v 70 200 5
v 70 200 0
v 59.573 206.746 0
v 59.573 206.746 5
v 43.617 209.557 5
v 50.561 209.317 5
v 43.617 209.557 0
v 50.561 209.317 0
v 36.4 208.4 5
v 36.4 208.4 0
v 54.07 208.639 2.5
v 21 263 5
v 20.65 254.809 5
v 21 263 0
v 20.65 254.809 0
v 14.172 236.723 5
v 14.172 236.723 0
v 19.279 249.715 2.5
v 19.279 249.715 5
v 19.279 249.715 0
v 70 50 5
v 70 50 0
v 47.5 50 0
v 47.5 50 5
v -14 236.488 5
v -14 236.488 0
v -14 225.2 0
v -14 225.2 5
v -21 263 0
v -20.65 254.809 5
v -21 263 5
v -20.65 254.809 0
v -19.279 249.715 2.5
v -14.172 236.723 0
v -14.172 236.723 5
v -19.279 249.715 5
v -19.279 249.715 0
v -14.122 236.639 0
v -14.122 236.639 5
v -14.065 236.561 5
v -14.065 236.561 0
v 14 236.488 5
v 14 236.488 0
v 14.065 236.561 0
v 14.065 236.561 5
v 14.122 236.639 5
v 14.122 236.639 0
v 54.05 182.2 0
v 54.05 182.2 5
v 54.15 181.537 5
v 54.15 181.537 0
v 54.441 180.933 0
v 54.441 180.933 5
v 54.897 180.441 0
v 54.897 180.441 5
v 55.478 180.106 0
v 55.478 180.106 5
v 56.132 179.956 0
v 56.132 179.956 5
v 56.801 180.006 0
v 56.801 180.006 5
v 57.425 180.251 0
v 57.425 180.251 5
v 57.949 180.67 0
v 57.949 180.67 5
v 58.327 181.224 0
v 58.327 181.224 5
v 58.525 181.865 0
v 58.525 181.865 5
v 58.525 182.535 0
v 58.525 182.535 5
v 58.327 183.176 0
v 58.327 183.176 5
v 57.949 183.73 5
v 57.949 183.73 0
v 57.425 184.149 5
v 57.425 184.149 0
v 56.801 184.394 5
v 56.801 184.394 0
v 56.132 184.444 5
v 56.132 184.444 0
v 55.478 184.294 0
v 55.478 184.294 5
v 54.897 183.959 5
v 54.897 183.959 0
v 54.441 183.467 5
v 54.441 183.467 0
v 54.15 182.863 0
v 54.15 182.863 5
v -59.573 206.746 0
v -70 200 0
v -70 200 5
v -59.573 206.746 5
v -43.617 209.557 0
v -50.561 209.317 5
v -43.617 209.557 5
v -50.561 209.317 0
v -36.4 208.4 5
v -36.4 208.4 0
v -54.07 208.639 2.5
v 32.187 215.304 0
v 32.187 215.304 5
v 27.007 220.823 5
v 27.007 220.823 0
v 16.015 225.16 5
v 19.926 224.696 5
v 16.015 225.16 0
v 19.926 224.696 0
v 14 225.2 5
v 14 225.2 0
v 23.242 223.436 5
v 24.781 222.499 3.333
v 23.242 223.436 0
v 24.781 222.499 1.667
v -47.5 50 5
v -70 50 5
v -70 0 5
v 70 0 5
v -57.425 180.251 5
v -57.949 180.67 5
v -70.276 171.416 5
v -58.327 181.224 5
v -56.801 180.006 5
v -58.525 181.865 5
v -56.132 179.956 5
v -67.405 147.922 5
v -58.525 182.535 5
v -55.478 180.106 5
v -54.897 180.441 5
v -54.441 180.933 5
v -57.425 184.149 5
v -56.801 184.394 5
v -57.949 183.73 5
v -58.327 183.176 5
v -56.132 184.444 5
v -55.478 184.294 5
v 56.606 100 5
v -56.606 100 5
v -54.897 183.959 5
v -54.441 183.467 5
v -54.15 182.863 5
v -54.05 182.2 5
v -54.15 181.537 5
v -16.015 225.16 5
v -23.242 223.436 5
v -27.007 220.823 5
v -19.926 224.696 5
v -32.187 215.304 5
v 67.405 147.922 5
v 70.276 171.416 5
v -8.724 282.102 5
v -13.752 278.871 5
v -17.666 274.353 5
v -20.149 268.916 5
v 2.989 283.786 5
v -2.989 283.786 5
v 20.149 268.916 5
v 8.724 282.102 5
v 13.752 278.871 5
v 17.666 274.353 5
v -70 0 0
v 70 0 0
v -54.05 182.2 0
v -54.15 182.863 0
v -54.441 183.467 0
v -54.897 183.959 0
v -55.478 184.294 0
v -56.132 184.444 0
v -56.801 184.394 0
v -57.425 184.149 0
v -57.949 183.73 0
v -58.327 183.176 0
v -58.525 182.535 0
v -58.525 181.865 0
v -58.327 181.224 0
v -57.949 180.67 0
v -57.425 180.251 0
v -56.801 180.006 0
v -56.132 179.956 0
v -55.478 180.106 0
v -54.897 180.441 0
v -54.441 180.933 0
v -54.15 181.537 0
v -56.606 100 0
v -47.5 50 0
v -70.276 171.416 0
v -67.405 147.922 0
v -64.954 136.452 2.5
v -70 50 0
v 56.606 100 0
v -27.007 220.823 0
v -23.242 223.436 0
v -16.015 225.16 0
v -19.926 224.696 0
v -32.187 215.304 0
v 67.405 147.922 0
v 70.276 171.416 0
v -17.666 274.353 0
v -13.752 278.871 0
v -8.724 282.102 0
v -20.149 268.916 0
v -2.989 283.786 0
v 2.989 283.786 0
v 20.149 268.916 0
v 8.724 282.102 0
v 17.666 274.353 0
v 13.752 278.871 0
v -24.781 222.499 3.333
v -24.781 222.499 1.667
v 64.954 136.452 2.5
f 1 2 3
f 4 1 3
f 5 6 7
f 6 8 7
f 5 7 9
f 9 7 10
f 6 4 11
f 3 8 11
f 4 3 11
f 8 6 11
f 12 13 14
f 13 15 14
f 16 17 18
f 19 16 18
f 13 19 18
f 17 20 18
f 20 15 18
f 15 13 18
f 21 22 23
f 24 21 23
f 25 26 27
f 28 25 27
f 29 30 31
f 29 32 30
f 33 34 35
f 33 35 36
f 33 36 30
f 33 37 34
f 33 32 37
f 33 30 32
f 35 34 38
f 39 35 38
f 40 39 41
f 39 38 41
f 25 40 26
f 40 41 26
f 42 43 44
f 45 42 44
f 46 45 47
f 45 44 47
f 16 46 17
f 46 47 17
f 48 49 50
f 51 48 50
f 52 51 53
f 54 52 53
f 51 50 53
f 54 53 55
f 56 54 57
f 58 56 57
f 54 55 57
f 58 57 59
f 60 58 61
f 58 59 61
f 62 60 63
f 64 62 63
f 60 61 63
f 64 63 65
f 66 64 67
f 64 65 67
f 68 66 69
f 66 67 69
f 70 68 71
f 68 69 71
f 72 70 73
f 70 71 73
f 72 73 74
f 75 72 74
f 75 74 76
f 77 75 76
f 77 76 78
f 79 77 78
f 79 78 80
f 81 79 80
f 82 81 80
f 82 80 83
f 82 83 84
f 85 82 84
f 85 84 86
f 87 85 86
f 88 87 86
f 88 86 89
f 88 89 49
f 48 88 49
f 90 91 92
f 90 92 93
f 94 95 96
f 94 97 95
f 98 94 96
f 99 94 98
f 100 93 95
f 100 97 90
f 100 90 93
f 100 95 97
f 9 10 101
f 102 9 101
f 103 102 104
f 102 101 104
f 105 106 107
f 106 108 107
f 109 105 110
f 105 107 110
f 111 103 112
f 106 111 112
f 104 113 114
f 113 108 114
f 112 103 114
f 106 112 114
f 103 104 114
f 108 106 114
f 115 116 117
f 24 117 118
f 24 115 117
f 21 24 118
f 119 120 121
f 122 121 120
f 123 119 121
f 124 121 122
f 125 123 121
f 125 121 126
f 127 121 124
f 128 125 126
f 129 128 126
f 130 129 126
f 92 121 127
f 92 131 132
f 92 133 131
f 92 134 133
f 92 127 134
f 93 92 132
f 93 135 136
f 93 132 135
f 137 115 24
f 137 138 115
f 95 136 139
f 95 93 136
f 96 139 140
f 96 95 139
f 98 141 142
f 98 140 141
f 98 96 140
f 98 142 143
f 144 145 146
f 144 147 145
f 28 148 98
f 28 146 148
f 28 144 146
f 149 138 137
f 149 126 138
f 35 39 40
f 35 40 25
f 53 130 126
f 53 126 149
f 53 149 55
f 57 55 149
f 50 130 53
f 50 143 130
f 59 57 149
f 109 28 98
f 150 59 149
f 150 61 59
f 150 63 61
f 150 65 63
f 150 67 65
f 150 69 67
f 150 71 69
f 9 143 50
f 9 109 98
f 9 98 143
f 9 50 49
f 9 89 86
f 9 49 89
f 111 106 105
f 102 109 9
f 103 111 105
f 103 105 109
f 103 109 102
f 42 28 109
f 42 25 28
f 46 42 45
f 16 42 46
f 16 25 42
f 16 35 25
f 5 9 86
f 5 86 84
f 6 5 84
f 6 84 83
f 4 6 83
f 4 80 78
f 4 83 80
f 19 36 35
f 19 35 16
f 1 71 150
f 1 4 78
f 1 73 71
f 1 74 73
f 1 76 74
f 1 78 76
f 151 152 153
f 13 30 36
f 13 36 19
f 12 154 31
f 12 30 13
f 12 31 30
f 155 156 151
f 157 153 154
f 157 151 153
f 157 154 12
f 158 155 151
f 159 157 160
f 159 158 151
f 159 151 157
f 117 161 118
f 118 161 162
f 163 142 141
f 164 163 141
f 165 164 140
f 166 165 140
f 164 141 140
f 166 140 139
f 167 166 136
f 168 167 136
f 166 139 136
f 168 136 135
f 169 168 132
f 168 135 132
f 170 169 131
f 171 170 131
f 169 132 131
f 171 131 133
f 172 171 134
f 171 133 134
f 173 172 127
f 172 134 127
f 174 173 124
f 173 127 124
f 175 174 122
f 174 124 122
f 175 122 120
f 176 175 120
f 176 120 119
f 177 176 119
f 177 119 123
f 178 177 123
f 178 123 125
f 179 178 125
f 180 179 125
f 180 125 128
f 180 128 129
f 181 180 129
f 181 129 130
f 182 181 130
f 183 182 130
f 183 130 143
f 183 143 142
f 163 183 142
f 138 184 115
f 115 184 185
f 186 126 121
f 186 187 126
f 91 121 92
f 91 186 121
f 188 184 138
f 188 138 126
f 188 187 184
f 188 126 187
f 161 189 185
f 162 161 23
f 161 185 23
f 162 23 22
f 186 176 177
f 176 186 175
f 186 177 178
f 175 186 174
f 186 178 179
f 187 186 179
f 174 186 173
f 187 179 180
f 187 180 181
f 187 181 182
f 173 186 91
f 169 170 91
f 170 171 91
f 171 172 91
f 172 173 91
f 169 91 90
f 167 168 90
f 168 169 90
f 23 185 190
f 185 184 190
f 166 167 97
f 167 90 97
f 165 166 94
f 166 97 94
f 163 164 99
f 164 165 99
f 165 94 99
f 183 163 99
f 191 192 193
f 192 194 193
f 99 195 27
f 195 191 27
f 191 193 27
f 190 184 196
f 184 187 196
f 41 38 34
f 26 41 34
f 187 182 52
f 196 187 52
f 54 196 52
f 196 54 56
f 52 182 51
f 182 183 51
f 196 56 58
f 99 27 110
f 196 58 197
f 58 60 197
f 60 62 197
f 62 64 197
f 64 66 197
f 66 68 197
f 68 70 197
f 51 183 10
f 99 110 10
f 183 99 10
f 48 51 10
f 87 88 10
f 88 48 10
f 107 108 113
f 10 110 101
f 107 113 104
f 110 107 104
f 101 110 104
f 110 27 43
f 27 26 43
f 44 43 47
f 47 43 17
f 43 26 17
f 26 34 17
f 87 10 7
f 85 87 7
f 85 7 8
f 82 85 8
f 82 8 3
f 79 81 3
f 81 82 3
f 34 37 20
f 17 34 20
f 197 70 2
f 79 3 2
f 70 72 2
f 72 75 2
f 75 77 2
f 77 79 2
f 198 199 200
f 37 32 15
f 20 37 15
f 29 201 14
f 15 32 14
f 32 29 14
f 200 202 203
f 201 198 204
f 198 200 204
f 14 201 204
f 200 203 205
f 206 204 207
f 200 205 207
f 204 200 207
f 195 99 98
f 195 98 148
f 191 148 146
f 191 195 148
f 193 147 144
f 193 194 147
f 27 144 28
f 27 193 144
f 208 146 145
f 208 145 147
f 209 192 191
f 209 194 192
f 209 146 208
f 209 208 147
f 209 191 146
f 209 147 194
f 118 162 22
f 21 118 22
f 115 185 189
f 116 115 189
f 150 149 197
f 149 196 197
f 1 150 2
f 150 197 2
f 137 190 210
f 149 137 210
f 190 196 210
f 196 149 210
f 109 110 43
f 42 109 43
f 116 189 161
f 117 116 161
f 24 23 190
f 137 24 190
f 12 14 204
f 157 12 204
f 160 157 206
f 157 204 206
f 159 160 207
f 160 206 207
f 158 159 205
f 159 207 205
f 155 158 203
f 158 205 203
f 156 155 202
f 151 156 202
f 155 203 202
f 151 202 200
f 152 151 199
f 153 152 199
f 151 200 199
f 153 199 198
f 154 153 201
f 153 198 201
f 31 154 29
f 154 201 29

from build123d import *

# Parameters (mm, degrees)
RESSALTO_EXTRUS_O1_DEPTH = 5
ESBO_O3_R                = 2.25
CORTE_EXTRUS_O1_DEPTH    = 293.648462736


with BuildPart() as part:
    # Esboço1 → Ressalto-extrusão1 (new body)
    with BuildSketch(Plane.XY):
        with BuildLine():
            Line((-70, 50), (-70, 0))
            Line((-70, 0), (70, 0))
            Line((70, 0), (70, 50))
            Line((70, 50), (47.5, 50))
            Line((47.5, 50), (56.60599572, 100))
            add(Edge.make_bspline(
                [(56.60599572, 100), (58.822881578, 111.230467147), (70.624101453, 157.653217098), (70.983496175, 170.948411875), (70, 200)],
                knots=[0, 0, 0, 0, 0.304799144, 1, 1, 1, 1], degree=3))
            add(Edge.make_bspline(
                [(70, 200), (54.940172813, 213.077606657), (36.4, 208.4)],
                knots=[0, 0, 0, 1, 1, 1], degree=2))
            add(Edge.make_bspline(
                [(36.4, 208.4), (36.384425779, 208.408148411), (31.853718899, 218.695035342), (19.625229428, 225.496752597), (14.287120073, 225.126645694), (14, 225.2)],
                knots=[0, 0, 0, 0, 0.552885048, 0.635199122, 0.823140743, 0.823140743, 0.823140743, 0.823140743], degree=3))
            Line((14, 225.2), (14, 236.488415854))
            ThreePointArc((14, 236.488415854), (14.0946545, 236.599459291), (14.172142078, 236.723095026))
            add(Edge.make_bspline(
                [(14.172142078, 236.723095026), (16.438682622, 241.005058154), (19.848023934, 251.961326161), (20.98093901, 253.933353369), (21, 263)],
                knots=[0.009275677, 0.009275677, 0.009275677, 0.009275677, 0.377960332, 0.746644988, 0.746644988, 0.746644988, 0.746644988], degree=3))
            ThreePointArc((21, 263), (0, 284), (-21, 263))
            add(Edge.make_bspline(
                [(-14.172142078, 236.723095026), (-16.438682622, 241.005058154), (-19.848023934, 251.961326161), (-20.98093901, 253.933353369), (-21, 263)],
                knots=[0.009275677, 0.009275677, 0.009275677, 0.009275677, 0.377960332, 0.746644988, 0.746644988, 0.746644988, 0.746644988], degree=3))
            ThreePointArc((-14.172142078, 236.723095026), (-14.0946545, 236.599459291), (-14, 236.488415854))
            Line((-14, 236.488415854), (-14, 225.2))
            add(Edge.make_bspline(
                [(-36.4, 208.4), (-36.384425779, 208.408148411), (-31.853718899, 218.695035342), (-19.625229428, 225.496752597), (-14.287120073, 225.126645694), (-14, 225.2)],
                knots=[0, 0, 0, 0, 0.552885048, 0.635199122, 0.823140743, 0.823140743, 0.823140743, 0.823140743], degree=3))
            add(Edge.make_bspline(
                [(-70, 200), (-54.940172813, 213.077606657), (-36.4, 208.4)],
                knots=[0, 0, 0, 1, 1, 1], degree=2))
            add(Edge.make_bspline(
                [(-56.60599572, 100), (-58.822881578, 111.230467147), (-70.624101453, 157.653217098), (-70.983496175, 170.948411875), (-70, 200)],
                knots=[0, 0, 0, 0, 0.304799144, 1, 1, 1, 1], degree=3))
            Line((-56.60599572, 100), (-47.5, 50))
            Line((-47.5, 50), (-70, 50))
        make_face()
    extrude(amount=RESSALTO_EXTRUS_O1_DEPTH)

    # Esboço3 → Corte-extrusão1 (cut, through all)
    with BuildSketch(Plane.XY.offset(5)):
        with Locations((-56.3, 182.2)):
            Circle(ESBO_O3_R)
        with Locations(Location((56.3, 182.2, 0), (0, 0, 180))):
            Circle(ESBO_O3_R)
    extrude(amount=-CORTE_EXTRUS_O1_DEPTH, mode=Mode.SUBTRACT)


solid = part.part
